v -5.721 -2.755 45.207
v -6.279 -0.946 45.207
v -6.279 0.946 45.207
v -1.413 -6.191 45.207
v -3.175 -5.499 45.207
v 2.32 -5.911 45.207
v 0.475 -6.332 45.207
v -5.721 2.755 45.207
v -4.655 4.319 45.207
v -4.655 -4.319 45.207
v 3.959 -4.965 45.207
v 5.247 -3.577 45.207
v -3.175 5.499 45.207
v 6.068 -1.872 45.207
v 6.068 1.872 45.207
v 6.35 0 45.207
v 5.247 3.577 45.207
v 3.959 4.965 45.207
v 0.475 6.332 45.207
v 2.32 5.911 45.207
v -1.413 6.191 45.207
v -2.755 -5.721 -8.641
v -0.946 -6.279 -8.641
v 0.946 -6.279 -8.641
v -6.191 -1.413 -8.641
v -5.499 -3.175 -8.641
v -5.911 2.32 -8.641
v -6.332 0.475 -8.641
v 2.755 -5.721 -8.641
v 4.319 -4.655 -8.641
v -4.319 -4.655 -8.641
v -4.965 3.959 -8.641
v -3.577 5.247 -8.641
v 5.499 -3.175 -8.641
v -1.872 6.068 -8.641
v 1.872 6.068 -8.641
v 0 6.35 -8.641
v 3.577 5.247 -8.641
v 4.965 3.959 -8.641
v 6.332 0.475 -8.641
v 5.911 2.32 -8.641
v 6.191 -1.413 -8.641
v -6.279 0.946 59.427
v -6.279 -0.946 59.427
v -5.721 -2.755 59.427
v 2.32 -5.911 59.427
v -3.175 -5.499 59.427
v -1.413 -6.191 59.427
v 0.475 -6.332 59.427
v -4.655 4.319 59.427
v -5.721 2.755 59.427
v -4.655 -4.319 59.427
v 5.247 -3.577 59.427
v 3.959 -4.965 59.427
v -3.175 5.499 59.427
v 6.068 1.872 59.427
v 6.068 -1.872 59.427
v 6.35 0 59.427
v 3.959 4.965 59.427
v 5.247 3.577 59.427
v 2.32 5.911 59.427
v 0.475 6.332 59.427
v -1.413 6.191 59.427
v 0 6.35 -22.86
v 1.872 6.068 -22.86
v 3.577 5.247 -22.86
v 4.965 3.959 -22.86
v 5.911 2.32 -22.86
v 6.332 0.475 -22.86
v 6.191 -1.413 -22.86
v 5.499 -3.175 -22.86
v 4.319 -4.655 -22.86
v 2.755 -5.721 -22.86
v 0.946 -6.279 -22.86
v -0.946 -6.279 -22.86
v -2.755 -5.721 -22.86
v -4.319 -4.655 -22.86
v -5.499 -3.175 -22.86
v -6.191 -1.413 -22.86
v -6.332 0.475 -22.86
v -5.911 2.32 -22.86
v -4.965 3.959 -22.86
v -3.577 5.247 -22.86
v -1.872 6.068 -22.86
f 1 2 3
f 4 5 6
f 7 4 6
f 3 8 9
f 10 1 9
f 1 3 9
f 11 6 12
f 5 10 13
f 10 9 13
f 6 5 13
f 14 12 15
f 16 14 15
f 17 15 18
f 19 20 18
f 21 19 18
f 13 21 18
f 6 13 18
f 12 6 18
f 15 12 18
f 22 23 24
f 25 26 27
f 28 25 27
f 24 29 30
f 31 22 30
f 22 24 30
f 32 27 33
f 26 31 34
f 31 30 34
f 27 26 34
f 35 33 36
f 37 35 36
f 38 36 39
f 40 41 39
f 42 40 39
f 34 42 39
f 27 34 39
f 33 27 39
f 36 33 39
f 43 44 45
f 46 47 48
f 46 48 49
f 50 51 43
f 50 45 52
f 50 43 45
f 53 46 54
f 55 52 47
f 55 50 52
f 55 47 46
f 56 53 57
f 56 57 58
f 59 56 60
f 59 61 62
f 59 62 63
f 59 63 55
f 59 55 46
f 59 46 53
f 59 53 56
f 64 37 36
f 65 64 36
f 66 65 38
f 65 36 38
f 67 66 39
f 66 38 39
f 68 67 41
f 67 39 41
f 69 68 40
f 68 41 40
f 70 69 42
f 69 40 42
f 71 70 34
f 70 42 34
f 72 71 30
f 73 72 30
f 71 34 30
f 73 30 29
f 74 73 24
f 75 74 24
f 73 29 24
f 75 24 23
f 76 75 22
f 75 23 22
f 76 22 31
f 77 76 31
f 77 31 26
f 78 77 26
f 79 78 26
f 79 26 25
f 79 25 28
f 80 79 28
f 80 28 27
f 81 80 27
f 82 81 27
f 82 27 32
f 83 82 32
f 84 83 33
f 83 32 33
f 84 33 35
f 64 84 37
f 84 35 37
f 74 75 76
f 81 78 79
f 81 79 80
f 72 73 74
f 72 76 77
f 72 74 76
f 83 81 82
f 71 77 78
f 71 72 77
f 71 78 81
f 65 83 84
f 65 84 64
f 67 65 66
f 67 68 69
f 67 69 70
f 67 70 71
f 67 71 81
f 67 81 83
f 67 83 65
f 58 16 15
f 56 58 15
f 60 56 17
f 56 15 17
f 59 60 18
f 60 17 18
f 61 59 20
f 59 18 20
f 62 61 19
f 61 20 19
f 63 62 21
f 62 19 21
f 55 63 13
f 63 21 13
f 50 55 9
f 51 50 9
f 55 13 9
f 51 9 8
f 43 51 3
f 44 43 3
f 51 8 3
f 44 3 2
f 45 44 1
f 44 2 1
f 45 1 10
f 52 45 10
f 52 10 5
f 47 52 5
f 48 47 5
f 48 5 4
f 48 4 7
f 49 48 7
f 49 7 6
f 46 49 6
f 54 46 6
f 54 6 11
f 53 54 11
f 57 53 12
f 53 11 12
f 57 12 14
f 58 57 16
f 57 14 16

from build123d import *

# Parameters (mm, degrees)
BOSS_EXTRUDE1_START     = -14.219322913
BOSS_EXTRUDE1_OUTLINE_R = 6.35
BOSS_EXTRUDE1_DEPTH     = 14.219322913
SKETCH3_R               = 6.35
BOSS_EXTRUDE2_DEPTH     = 14.219322913


# Read off the part's stored shape, not the designer's step: Boss-Extrude1
with BuildPart() as part:
    # Boss-Extrude1 outline → Boss-Extrude1 (new body)
    with BuildSketch(Plane.XY.offset(59.426645827).offset(BOSS_EXTRUDE1_START)):
        Circle(BOSS_EXTRUDE1_OUTLINE_R)
    extrude(amount=BOSS_EXTRUDE1_DEPTH)


with BuildPart() as body_2:
    # Sketch3 → Boss-Extrude2 (new body)
    with BuildSketch(Plane(origin=(0, 0, -8.640677087), x_dir=(-1, 0, 0), z_dir=(0, 0, -1))):
        with Locations(Location((0, 0, 0), (0, 0, 90))):
            Circle(SKETCH3_R)
    extrude(amount=BOSS_EXTRUDE2_DEPTH)


solid = Compound([part.part, body_2.part])
